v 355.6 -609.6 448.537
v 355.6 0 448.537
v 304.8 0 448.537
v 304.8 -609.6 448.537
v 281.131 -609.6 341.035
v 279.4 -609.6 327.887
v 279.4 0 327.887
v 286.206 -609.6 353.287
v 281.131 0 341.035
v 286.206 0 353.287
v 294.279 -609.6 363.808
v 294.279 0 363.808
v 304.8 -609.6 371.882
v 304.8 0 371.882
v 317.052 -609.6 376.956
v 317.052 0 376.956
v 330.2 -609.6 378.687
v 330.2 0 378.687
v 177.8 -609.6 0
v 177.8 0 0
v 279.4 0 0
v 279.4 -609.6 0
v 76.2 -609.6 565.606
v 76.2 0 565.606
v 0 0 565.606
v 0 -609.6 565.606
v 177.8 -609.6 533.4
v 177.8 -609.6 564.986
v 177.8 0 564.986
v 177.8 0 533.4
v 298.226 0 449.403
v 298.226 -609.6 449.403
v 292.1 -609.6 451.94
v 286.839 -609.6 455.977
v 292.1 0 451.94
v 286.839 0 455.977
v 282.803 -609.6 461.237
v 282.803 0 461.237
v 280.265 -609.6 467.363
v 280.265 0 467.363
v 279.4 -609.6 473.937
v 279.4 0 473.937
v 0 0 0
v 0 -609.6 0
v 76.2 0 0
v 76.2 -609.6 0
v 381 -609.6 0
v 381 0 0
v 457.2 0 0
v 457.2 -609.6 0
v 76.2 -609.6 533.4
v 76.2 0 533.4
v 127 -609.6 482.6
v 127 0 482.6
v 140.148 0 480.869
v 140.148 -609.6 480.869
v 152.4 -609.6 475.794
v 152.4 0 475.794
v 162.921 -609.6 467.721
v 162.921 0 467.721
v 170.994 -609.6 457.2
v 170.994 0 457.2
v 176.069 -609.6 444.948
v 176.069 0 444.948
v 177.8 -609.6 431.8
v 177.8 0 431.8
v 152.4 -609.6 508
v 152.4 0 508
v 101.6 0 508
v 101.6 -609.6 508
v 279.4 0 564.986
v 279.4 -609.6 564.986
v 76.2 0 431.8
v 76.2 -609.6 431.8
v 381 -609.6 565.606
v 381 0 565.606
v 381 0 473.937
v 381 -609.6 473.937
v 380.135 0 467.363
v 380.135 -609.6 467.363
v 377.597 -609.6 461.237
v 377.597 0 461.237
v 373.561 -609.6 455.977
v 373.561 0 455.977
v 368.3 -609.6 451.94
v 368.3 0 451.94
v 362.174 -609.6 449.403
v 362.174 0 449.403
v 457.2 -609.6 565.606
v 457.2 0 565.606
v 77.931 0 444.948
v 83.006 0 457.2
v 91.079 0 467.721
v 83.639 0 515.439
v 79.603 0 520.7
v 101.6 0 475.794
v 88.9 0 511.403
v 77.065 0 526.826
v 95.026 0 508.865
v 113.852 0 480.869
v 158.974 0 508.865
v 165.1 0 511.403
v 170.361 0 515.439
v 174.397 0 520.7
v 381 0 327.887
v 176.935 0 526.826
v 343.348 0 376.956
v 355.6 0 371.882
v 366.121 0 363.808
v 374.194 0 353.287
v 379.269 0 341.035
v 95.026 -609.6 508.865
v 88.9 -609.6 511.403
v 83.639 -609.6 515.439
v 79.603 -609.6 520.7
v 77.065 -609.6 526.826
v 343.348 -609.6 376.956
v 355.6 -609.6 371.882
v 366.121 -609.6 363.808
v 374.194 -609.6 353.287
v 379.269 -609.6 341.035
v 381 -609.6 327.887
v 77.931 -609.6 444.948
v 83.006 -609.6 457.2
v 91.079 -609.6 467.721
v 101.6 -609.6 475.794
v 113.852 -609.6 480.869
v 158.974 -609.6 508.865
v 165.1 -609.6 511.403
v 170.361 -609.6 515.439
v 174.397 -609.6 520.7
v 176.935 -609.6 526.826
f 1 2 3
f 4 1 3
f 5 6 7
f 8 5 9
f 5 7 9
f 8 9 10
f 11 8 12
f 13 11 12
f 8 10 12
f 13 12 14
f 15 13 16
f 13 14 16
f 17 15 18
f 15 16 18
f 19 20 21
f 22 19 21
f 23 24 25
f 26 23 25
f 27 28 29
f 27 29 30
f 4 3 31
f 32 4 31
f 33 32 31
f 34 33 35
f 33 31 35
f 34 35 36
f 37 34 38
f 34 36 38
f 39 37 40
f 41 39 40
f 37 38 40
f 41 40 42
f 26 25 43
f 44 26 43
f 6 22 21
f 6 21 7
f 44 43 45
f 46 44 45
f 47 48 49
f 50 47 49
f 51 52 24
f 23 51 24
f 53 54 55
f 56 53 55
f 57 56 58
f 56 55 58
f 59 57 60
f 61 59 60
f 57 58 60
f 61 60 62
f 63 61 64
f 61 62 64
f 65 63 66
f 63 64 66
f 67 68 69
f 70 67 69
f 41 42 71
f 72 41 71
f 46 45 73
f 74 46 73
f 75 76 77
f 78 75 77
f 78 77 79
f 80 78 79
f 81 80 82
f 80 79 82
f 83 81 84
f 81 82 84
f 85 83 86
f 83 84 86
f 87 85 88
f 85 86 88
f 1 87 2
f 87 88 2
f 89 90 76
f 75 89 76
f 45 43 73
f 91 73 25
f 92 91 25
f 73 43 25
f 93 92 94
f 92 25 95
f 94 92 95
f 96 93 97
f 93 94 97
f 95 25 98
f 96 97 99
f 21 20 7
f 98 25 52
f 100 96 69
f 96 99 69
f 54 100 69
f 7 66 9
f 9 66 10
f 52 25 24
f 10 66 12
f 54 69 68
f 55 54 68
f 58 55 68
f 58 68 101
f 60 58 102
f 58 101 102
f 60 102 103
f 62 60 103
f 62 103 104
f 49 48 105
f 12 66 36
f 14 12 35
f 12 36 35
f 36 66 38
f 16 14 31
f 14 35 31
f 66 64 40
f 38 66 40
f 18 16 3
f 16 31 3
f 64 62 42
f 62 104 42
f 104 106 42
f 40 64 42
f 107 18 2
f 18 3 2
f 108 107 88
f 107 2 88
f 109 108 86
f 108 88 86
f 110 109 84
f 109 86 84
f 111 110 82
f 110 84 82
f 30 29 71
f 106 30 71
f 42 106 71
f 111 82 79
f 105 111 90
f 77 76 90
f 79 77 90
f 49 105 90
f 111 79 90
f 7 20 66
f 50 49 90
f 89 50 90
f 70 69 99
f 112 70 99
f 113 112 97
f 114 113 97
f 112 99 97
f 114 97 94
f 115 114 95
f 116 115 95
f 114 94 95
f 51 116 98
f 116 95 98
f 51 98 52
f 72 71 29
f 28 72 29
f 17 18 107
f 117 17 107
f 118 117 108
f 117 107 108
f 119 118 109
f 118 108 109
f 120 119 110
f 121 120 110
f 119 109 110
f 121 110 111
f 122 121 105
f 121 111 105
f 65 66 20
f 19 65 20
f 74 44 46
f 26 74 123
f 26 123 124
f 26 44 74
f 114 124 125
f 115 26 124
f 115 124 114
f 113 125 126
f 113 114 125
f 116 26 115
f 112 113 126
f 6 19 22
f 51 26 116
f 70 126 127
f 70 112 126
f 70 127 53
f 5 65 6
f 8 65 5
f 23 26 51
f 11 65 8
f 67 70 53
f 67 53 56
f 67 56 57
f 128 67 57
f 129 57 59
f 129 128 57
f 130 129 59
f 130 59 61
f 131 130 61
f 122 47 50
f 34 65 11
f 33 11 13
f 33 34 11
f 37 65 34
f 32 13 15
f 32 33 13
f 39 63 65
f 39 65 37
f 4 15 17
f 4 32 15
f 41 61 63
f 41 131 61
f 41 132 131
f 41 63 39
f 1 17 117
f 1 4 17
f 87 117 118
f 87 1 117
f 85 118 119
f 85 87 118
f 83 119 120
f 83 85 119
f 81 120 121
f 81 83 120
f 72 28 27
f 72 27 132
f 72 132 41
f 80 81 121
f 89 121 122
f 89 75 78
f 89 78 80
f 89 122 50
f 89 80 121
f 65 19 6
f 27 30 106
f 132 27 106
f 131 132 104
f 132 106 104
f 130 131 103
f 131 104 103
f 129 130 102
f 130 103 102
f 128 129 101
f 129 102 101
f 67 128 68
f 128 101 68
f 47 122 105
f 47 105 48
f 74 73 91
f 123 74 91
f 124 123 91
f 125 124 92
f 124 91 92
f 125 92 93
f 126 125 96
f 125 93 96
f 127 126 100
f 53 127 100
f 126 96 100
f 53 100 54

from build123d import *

# Parameters (mm, degrees)
F1_DEPTH = 609.6


with BuildPart() as f1:
    # F0 (on Front) → F1 (new body)
    with BuildSketch(Plane.XZ):
        with BuildLine():
            Line((0, 431.8), (0, 0))
            Line((0, 0), (76.2, 0))
            Line((76.2, 0), (76.2, 431.8))
            ThreePointArc((76.2, 431.8), (91.078976, 467.721024), (127, 482.6))
            ThreePointArc((127, 482.6), (162.921024, 467.721024), (177.8, 431.8))
            Line((177.8, 431.8), (177.8, 0))
            Line((177.8, 0), (279.4, 0))
            Line((279.4, 0), (279.4, 327.887458))
            ThreePointArc((279.4, 327.887458), (294.278976, 363.808483), (330.2, 378.687458))
            ThreePointArc((330.2, 378.687458), (366.121024, 363.808483), (381, 327.887458))
            Line((381, 327.887458), (381, 0))
            Line((381, 0), (457.2, 0))
            Line((457.2, 0), (457.2, 565.605909))
            Line((457.2, 565.605909), (381, 565.605909))
            Line((381, 565.605909), (381, 473.937458))
            ThreePointArc((381, 473.937458), (373.560512, 455.976946), (355.6, 448.537458))
            Line((355.6, 448.537458), (304.8, 448.537458))
            ThreePointArc((304.8, 448.537458), (286.839488, 455.976946), (279.4, 473.937458))
            Line((279.4, 473.937458), (279.4, 564.986005))
            Line((279.4, 564.986005), (177.8, 564.986005))
            Line((177.8, 564.986005), (177.8, 533.4))
            ThreePointArc((177.8, 533.4), (170.360512, 515.439488), (152.4, 508))
            Line((152.4, 508), (101.6, 508))
            ThreePointArc((101.6, 508), (83.639488, 515.439488), (76.2, 533.4))
            Line((76.2, 533.4), (76.2, 565.605909))
            Line((76.2, 565.605909), (0, 565.605909))
            Line((0, 565.605909), (0, 431.8))
        make_face()
    extrude(amount=F1_DEPTH)


solid = f1.part
